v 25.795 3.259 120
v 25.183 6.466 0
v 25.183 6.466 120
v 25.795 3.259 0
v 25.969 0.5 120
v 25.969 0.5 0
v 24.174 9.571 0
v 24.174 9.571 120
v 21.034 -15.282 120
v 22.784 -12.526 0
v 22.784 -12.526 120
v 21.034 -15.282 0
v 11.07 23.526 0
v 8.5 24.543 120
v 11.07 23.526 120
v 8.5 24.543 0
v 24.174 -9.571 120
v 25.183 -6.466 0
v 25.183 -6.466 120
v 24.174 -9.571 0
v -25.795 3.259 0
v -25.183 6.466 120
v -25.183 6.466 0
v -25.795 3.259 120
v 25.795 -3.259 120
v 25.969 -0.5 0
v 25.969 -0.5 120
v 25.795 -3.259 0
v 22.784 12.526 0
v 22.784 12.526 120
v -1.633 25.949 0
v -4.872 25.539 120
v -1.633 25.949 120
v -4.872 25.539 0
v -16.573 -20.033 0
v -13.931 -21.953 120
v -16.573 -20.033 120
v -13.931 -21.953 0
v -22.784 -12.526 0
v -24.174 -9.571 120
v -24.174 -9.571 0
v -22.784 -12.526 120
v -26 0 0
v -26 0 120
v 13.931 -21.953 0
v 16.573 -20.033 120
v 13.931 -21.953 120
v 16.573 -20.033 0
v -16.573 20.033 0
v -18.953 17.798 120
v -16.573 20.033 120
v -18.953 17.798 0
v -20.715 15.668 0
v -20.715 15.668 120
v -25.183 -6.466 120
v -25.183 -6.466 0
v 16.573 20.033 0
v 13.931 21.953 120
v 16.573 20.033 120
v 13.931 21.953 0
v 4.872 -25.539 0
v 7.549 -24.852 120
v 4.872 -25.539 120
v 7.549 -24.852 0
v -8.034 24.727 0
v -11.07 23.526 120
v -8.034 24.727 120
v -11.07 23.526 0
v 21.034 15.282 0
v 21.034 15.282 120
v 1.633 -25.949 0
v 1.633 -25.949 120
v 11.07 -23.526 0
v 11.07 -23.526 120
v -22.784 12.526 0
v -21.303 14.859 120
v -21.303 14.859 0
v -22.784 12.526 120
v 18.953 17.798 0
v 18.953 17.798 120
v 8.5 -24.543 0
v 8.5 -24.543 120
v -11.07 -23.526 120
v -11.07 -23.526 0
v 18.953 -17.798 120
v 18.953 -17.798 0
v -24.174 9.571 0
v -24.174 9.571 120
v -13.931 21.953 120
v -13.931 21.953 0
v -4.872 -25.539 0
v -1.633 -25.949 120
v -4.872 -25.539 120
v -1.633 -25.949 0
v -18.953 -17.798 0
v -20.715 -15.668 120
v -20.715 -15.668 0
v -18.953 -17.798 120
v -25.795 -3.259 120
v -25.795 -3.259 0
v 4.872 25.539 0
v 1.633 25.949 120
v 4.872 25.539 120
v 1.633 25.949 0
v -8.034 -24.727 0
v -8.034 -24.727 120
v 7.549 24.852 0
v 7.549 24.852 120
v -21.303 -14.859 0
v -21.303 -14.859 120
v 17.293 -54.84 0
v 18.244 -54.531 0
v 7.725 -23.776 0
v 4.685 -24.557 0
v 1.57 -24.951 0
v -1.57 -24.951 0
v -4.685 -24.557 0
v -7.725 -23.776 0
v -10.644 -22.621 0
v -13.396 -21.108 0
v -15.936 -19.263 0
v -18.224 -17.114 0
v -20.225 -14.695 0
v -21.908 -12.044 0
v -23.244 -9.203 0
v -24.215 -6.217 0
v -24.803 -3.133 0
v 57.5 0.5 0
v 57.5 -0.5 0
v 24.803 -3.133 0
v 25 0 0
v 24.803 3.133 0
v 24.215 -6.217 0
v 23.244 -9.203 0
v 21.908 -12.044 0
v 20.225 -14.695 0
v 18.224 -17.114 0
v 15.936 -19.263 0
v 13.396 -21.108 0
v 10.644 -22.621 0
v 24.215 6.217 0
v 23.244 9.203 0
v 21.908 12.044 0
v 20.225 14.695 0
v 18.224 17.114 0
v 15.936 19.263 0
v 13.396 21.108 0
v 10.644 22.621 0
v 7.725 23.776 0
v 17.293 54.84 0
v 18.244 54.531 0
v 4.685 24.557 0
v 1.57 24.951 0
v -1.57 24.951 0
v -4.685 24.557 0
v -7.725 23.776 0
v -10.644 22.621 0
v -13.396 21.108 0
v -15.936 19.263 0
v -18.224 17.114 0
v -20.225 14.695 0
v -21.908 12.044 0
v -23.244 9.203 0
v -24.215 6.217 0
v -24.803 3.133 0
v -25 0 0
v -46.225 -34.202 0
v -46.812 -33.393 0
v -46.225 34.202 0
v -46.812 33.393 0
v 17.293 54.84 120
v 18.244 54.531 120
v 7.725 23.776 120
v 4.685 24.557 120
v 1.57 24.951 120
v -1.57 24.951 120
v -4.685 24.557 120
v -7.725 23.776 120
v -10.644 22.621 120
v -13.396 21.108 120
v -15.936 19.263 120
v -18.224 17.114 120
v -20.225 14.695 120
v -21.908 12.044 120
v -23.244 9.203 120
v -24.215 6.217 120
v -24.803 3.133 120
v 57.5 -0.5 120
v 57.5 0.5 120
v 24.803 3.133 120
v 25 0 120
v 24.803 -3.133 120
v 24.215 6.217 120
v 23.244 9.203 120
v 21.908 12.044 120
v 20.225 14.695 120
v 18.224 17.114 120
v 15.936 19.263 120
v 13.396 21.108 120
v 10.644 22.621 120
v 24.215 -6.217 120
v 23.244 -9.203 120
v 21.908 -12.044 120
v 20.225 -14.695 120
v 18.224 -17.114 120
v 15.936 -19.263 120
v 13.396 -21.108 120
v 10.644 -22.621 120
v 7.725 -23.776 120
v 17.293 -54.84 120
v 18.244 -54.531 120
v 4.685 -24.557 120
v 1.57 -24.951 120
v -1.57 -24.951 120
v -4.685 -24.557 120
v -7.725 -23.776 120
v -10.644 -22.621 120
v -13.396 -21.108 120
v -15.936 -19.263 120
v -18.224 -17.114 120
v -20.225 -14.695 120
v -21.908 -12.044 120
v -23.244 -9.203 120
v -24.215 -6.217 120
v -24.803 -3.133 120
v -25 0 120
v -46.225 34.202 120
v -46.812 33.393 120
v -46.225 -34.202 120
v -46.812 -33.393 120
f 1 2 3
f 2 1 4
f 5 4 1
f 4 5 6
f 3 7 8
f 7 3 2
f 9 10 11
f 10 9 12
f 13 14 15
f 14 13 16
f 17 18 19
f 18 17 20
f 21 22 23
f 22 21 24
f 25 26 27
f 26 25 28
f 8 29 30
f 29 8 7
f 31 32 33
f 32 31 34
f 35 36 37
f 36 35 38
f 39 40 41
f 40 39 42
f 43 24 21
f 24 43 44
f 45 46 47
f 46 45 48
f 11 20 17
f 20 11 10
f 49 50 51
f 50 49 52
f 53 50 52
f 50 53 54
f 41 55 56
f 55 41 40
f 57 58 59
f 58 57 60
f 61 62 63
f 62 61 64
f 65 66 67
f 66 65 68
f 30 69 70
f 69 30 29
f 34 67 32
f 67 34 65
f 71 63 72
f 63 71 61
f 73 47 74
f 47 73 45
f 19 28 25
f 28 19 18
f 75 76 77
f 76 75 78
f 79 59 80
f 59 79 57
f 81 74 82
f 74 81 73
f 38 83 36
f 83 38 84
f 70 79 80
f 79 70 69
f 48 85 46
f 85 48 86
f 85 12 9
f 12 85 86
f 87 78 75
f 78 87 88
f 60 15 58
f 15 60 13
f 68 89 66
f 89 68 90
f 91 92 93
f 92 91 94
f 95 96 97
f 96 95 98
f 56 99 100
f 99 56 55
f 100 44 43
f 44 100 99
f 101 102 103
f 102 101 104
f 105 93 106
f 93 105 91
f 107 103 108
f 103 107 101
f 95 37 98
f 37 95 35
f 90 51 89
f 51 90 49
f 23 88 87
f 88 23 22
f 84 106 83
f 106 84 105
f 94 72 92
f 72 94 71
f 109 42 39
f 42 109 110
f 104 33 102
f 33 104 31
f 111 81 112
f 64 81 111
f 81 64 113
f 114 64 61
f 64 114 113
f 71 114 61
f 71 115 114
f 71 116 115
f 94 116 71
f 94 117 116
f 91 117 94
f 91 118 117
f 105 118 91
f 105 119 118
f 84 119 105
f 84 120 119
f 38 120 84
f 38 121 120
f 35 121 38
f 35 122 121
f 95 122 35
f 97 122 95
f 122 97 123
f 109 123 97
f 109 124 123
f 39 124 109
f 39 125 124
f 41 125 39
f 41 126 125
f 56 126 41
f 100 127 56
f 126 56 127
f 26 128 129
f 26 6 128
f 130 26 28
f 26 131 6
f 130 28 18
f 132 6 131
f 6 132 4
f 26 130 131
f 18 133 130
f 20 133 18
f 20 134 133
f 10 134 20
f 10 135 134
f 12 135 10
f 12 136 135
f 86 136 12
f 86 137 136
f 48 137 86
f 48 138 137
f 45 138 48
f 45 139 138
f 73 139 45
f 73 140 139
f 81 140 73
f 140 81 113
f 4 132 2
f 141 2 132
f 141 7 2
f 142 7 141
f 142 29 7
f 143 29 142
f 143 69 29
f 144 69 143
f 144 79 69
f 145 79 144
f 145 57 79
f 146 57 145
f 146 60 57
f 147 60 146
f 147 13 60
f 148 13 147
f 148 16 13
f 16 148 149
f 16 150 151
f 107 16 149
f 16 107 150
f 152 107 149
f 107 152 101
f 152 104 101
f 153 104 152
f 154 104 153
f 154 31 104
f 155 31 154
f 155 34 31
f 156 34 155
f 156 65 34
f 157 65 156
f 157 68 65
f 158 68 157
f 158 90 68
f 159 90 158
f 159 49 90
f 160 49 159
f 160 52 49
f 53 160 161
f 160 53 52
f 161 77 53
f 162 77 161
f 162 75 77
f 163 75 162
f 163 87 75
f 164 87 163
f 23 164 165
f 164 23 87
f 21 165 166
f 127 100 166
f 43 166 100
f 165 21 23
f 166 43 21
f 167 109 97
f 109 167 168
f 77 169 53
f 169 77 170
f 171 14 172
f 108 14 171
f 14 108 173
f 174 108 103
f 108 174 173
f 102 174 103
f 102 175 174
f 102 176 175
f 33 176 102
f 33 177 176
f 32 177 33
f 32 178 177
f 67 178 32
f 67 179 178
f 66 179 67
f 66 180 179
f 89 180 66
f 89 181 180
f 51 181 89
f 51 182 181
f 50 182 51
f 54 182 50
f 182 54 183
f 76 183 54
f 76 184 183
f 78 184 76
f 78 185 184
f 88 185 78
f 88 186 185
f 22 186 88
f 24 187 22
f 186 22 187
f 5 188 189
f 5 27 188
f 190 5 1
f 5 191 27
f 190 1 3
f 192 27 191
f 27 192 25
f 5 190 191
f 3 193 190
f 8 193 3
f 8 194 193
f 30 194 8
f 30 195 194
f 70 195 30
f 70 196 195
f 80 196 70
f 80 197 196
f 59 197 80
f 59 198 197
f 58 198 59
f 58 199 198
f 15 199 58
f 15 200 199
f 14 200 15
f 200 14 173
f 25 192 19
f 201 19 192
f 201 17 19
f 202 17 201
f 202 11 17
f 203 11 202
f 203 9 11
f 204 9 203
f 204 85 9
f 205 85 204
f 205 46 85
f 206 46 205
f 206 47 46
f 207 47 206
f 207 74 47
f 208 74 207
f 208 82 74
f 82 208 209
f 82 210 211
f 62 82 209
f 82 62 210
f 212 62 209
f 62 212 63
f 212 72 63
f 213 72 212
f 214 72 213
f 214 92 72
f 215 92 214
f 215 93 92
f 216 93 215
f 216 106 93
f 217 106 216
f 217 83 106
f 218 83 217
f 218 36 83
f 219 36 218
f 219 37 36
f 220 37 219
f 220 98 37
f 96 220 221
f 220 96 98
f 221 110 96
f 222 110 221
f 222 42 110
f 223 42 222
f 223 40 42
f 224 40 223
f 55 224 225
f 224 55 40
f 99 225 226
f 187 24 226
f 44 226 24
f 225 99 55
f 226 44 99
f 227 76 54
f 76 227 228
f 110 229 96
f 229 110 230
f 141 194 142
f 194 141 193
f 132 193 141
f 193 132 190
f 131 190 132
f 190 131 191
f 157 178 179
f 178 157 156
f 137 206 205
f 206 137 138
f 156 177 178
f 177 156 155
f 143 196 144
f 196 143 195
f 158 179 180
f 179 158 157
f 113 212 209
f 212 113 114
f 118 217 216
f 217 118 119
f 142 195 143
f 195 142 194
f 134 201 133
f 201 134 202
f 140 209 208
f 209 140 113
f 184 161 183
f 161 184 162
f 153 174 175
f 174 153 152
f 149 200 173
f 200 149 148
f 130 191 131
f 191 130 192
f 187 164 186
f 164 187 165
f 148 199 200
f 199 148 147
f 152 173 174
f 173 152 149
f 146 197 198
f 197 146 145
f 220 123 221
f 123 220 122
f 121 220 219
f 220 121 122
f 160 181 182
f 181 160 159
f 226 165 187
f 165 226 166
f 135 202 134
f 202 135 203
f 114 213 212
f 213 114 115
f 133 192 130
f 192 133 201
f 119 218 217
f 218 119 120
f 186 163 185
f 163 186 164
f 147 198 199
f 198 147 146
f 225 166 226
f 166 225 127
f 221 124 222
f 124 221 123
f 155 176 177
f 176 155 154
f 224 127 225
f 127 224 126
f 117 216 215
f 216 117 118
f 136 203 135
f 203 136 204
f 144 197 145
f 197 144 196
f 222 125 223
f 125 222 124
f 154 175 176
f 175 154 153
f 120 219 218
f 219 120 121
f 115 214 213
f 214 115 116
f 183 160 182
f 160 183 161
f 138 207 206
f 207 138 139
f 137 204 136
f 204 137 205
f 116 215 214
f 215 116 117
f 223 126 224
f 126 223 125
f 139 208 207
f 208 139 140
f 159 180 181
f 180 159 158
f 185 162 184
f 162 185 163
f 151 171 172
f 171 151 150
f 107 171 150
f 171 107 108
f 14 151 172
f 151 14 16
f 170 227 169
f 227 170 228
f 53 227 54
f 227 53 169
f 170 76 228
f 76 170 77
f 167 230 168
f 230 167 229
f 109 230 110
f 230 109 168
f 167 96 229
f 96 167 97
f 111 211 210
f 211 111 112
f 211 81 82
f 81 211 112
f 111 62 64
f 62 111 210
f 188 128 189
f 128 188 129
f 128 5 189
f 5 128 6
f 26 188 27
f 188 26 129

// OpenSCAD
WALL_THICKNESS = 1;
HEIGHT = 120;
DIAMETER = 115;
INNER_DIA = 50;
N_PARTS = 5;

$fn = 50;

union() {
    difference() {
        cylinder(d = INNER_DIA + 2 * WALL_THICKNESS, h = HEIGHT);
        cylinder(d = INNER_DIA, h = HEIGHT);
    }
    for(i = [1:N_PARTS]) {
        rotate([0, 0, i * 360/N_PARTS])
        translate([INNER_DIA/2, -WALL_THICKNESS/2, 0])
        cube(size = [(DIAMETER-INNER_DIA)/2, WALL_THICKNESS, HEIGHT]);
    }
}
